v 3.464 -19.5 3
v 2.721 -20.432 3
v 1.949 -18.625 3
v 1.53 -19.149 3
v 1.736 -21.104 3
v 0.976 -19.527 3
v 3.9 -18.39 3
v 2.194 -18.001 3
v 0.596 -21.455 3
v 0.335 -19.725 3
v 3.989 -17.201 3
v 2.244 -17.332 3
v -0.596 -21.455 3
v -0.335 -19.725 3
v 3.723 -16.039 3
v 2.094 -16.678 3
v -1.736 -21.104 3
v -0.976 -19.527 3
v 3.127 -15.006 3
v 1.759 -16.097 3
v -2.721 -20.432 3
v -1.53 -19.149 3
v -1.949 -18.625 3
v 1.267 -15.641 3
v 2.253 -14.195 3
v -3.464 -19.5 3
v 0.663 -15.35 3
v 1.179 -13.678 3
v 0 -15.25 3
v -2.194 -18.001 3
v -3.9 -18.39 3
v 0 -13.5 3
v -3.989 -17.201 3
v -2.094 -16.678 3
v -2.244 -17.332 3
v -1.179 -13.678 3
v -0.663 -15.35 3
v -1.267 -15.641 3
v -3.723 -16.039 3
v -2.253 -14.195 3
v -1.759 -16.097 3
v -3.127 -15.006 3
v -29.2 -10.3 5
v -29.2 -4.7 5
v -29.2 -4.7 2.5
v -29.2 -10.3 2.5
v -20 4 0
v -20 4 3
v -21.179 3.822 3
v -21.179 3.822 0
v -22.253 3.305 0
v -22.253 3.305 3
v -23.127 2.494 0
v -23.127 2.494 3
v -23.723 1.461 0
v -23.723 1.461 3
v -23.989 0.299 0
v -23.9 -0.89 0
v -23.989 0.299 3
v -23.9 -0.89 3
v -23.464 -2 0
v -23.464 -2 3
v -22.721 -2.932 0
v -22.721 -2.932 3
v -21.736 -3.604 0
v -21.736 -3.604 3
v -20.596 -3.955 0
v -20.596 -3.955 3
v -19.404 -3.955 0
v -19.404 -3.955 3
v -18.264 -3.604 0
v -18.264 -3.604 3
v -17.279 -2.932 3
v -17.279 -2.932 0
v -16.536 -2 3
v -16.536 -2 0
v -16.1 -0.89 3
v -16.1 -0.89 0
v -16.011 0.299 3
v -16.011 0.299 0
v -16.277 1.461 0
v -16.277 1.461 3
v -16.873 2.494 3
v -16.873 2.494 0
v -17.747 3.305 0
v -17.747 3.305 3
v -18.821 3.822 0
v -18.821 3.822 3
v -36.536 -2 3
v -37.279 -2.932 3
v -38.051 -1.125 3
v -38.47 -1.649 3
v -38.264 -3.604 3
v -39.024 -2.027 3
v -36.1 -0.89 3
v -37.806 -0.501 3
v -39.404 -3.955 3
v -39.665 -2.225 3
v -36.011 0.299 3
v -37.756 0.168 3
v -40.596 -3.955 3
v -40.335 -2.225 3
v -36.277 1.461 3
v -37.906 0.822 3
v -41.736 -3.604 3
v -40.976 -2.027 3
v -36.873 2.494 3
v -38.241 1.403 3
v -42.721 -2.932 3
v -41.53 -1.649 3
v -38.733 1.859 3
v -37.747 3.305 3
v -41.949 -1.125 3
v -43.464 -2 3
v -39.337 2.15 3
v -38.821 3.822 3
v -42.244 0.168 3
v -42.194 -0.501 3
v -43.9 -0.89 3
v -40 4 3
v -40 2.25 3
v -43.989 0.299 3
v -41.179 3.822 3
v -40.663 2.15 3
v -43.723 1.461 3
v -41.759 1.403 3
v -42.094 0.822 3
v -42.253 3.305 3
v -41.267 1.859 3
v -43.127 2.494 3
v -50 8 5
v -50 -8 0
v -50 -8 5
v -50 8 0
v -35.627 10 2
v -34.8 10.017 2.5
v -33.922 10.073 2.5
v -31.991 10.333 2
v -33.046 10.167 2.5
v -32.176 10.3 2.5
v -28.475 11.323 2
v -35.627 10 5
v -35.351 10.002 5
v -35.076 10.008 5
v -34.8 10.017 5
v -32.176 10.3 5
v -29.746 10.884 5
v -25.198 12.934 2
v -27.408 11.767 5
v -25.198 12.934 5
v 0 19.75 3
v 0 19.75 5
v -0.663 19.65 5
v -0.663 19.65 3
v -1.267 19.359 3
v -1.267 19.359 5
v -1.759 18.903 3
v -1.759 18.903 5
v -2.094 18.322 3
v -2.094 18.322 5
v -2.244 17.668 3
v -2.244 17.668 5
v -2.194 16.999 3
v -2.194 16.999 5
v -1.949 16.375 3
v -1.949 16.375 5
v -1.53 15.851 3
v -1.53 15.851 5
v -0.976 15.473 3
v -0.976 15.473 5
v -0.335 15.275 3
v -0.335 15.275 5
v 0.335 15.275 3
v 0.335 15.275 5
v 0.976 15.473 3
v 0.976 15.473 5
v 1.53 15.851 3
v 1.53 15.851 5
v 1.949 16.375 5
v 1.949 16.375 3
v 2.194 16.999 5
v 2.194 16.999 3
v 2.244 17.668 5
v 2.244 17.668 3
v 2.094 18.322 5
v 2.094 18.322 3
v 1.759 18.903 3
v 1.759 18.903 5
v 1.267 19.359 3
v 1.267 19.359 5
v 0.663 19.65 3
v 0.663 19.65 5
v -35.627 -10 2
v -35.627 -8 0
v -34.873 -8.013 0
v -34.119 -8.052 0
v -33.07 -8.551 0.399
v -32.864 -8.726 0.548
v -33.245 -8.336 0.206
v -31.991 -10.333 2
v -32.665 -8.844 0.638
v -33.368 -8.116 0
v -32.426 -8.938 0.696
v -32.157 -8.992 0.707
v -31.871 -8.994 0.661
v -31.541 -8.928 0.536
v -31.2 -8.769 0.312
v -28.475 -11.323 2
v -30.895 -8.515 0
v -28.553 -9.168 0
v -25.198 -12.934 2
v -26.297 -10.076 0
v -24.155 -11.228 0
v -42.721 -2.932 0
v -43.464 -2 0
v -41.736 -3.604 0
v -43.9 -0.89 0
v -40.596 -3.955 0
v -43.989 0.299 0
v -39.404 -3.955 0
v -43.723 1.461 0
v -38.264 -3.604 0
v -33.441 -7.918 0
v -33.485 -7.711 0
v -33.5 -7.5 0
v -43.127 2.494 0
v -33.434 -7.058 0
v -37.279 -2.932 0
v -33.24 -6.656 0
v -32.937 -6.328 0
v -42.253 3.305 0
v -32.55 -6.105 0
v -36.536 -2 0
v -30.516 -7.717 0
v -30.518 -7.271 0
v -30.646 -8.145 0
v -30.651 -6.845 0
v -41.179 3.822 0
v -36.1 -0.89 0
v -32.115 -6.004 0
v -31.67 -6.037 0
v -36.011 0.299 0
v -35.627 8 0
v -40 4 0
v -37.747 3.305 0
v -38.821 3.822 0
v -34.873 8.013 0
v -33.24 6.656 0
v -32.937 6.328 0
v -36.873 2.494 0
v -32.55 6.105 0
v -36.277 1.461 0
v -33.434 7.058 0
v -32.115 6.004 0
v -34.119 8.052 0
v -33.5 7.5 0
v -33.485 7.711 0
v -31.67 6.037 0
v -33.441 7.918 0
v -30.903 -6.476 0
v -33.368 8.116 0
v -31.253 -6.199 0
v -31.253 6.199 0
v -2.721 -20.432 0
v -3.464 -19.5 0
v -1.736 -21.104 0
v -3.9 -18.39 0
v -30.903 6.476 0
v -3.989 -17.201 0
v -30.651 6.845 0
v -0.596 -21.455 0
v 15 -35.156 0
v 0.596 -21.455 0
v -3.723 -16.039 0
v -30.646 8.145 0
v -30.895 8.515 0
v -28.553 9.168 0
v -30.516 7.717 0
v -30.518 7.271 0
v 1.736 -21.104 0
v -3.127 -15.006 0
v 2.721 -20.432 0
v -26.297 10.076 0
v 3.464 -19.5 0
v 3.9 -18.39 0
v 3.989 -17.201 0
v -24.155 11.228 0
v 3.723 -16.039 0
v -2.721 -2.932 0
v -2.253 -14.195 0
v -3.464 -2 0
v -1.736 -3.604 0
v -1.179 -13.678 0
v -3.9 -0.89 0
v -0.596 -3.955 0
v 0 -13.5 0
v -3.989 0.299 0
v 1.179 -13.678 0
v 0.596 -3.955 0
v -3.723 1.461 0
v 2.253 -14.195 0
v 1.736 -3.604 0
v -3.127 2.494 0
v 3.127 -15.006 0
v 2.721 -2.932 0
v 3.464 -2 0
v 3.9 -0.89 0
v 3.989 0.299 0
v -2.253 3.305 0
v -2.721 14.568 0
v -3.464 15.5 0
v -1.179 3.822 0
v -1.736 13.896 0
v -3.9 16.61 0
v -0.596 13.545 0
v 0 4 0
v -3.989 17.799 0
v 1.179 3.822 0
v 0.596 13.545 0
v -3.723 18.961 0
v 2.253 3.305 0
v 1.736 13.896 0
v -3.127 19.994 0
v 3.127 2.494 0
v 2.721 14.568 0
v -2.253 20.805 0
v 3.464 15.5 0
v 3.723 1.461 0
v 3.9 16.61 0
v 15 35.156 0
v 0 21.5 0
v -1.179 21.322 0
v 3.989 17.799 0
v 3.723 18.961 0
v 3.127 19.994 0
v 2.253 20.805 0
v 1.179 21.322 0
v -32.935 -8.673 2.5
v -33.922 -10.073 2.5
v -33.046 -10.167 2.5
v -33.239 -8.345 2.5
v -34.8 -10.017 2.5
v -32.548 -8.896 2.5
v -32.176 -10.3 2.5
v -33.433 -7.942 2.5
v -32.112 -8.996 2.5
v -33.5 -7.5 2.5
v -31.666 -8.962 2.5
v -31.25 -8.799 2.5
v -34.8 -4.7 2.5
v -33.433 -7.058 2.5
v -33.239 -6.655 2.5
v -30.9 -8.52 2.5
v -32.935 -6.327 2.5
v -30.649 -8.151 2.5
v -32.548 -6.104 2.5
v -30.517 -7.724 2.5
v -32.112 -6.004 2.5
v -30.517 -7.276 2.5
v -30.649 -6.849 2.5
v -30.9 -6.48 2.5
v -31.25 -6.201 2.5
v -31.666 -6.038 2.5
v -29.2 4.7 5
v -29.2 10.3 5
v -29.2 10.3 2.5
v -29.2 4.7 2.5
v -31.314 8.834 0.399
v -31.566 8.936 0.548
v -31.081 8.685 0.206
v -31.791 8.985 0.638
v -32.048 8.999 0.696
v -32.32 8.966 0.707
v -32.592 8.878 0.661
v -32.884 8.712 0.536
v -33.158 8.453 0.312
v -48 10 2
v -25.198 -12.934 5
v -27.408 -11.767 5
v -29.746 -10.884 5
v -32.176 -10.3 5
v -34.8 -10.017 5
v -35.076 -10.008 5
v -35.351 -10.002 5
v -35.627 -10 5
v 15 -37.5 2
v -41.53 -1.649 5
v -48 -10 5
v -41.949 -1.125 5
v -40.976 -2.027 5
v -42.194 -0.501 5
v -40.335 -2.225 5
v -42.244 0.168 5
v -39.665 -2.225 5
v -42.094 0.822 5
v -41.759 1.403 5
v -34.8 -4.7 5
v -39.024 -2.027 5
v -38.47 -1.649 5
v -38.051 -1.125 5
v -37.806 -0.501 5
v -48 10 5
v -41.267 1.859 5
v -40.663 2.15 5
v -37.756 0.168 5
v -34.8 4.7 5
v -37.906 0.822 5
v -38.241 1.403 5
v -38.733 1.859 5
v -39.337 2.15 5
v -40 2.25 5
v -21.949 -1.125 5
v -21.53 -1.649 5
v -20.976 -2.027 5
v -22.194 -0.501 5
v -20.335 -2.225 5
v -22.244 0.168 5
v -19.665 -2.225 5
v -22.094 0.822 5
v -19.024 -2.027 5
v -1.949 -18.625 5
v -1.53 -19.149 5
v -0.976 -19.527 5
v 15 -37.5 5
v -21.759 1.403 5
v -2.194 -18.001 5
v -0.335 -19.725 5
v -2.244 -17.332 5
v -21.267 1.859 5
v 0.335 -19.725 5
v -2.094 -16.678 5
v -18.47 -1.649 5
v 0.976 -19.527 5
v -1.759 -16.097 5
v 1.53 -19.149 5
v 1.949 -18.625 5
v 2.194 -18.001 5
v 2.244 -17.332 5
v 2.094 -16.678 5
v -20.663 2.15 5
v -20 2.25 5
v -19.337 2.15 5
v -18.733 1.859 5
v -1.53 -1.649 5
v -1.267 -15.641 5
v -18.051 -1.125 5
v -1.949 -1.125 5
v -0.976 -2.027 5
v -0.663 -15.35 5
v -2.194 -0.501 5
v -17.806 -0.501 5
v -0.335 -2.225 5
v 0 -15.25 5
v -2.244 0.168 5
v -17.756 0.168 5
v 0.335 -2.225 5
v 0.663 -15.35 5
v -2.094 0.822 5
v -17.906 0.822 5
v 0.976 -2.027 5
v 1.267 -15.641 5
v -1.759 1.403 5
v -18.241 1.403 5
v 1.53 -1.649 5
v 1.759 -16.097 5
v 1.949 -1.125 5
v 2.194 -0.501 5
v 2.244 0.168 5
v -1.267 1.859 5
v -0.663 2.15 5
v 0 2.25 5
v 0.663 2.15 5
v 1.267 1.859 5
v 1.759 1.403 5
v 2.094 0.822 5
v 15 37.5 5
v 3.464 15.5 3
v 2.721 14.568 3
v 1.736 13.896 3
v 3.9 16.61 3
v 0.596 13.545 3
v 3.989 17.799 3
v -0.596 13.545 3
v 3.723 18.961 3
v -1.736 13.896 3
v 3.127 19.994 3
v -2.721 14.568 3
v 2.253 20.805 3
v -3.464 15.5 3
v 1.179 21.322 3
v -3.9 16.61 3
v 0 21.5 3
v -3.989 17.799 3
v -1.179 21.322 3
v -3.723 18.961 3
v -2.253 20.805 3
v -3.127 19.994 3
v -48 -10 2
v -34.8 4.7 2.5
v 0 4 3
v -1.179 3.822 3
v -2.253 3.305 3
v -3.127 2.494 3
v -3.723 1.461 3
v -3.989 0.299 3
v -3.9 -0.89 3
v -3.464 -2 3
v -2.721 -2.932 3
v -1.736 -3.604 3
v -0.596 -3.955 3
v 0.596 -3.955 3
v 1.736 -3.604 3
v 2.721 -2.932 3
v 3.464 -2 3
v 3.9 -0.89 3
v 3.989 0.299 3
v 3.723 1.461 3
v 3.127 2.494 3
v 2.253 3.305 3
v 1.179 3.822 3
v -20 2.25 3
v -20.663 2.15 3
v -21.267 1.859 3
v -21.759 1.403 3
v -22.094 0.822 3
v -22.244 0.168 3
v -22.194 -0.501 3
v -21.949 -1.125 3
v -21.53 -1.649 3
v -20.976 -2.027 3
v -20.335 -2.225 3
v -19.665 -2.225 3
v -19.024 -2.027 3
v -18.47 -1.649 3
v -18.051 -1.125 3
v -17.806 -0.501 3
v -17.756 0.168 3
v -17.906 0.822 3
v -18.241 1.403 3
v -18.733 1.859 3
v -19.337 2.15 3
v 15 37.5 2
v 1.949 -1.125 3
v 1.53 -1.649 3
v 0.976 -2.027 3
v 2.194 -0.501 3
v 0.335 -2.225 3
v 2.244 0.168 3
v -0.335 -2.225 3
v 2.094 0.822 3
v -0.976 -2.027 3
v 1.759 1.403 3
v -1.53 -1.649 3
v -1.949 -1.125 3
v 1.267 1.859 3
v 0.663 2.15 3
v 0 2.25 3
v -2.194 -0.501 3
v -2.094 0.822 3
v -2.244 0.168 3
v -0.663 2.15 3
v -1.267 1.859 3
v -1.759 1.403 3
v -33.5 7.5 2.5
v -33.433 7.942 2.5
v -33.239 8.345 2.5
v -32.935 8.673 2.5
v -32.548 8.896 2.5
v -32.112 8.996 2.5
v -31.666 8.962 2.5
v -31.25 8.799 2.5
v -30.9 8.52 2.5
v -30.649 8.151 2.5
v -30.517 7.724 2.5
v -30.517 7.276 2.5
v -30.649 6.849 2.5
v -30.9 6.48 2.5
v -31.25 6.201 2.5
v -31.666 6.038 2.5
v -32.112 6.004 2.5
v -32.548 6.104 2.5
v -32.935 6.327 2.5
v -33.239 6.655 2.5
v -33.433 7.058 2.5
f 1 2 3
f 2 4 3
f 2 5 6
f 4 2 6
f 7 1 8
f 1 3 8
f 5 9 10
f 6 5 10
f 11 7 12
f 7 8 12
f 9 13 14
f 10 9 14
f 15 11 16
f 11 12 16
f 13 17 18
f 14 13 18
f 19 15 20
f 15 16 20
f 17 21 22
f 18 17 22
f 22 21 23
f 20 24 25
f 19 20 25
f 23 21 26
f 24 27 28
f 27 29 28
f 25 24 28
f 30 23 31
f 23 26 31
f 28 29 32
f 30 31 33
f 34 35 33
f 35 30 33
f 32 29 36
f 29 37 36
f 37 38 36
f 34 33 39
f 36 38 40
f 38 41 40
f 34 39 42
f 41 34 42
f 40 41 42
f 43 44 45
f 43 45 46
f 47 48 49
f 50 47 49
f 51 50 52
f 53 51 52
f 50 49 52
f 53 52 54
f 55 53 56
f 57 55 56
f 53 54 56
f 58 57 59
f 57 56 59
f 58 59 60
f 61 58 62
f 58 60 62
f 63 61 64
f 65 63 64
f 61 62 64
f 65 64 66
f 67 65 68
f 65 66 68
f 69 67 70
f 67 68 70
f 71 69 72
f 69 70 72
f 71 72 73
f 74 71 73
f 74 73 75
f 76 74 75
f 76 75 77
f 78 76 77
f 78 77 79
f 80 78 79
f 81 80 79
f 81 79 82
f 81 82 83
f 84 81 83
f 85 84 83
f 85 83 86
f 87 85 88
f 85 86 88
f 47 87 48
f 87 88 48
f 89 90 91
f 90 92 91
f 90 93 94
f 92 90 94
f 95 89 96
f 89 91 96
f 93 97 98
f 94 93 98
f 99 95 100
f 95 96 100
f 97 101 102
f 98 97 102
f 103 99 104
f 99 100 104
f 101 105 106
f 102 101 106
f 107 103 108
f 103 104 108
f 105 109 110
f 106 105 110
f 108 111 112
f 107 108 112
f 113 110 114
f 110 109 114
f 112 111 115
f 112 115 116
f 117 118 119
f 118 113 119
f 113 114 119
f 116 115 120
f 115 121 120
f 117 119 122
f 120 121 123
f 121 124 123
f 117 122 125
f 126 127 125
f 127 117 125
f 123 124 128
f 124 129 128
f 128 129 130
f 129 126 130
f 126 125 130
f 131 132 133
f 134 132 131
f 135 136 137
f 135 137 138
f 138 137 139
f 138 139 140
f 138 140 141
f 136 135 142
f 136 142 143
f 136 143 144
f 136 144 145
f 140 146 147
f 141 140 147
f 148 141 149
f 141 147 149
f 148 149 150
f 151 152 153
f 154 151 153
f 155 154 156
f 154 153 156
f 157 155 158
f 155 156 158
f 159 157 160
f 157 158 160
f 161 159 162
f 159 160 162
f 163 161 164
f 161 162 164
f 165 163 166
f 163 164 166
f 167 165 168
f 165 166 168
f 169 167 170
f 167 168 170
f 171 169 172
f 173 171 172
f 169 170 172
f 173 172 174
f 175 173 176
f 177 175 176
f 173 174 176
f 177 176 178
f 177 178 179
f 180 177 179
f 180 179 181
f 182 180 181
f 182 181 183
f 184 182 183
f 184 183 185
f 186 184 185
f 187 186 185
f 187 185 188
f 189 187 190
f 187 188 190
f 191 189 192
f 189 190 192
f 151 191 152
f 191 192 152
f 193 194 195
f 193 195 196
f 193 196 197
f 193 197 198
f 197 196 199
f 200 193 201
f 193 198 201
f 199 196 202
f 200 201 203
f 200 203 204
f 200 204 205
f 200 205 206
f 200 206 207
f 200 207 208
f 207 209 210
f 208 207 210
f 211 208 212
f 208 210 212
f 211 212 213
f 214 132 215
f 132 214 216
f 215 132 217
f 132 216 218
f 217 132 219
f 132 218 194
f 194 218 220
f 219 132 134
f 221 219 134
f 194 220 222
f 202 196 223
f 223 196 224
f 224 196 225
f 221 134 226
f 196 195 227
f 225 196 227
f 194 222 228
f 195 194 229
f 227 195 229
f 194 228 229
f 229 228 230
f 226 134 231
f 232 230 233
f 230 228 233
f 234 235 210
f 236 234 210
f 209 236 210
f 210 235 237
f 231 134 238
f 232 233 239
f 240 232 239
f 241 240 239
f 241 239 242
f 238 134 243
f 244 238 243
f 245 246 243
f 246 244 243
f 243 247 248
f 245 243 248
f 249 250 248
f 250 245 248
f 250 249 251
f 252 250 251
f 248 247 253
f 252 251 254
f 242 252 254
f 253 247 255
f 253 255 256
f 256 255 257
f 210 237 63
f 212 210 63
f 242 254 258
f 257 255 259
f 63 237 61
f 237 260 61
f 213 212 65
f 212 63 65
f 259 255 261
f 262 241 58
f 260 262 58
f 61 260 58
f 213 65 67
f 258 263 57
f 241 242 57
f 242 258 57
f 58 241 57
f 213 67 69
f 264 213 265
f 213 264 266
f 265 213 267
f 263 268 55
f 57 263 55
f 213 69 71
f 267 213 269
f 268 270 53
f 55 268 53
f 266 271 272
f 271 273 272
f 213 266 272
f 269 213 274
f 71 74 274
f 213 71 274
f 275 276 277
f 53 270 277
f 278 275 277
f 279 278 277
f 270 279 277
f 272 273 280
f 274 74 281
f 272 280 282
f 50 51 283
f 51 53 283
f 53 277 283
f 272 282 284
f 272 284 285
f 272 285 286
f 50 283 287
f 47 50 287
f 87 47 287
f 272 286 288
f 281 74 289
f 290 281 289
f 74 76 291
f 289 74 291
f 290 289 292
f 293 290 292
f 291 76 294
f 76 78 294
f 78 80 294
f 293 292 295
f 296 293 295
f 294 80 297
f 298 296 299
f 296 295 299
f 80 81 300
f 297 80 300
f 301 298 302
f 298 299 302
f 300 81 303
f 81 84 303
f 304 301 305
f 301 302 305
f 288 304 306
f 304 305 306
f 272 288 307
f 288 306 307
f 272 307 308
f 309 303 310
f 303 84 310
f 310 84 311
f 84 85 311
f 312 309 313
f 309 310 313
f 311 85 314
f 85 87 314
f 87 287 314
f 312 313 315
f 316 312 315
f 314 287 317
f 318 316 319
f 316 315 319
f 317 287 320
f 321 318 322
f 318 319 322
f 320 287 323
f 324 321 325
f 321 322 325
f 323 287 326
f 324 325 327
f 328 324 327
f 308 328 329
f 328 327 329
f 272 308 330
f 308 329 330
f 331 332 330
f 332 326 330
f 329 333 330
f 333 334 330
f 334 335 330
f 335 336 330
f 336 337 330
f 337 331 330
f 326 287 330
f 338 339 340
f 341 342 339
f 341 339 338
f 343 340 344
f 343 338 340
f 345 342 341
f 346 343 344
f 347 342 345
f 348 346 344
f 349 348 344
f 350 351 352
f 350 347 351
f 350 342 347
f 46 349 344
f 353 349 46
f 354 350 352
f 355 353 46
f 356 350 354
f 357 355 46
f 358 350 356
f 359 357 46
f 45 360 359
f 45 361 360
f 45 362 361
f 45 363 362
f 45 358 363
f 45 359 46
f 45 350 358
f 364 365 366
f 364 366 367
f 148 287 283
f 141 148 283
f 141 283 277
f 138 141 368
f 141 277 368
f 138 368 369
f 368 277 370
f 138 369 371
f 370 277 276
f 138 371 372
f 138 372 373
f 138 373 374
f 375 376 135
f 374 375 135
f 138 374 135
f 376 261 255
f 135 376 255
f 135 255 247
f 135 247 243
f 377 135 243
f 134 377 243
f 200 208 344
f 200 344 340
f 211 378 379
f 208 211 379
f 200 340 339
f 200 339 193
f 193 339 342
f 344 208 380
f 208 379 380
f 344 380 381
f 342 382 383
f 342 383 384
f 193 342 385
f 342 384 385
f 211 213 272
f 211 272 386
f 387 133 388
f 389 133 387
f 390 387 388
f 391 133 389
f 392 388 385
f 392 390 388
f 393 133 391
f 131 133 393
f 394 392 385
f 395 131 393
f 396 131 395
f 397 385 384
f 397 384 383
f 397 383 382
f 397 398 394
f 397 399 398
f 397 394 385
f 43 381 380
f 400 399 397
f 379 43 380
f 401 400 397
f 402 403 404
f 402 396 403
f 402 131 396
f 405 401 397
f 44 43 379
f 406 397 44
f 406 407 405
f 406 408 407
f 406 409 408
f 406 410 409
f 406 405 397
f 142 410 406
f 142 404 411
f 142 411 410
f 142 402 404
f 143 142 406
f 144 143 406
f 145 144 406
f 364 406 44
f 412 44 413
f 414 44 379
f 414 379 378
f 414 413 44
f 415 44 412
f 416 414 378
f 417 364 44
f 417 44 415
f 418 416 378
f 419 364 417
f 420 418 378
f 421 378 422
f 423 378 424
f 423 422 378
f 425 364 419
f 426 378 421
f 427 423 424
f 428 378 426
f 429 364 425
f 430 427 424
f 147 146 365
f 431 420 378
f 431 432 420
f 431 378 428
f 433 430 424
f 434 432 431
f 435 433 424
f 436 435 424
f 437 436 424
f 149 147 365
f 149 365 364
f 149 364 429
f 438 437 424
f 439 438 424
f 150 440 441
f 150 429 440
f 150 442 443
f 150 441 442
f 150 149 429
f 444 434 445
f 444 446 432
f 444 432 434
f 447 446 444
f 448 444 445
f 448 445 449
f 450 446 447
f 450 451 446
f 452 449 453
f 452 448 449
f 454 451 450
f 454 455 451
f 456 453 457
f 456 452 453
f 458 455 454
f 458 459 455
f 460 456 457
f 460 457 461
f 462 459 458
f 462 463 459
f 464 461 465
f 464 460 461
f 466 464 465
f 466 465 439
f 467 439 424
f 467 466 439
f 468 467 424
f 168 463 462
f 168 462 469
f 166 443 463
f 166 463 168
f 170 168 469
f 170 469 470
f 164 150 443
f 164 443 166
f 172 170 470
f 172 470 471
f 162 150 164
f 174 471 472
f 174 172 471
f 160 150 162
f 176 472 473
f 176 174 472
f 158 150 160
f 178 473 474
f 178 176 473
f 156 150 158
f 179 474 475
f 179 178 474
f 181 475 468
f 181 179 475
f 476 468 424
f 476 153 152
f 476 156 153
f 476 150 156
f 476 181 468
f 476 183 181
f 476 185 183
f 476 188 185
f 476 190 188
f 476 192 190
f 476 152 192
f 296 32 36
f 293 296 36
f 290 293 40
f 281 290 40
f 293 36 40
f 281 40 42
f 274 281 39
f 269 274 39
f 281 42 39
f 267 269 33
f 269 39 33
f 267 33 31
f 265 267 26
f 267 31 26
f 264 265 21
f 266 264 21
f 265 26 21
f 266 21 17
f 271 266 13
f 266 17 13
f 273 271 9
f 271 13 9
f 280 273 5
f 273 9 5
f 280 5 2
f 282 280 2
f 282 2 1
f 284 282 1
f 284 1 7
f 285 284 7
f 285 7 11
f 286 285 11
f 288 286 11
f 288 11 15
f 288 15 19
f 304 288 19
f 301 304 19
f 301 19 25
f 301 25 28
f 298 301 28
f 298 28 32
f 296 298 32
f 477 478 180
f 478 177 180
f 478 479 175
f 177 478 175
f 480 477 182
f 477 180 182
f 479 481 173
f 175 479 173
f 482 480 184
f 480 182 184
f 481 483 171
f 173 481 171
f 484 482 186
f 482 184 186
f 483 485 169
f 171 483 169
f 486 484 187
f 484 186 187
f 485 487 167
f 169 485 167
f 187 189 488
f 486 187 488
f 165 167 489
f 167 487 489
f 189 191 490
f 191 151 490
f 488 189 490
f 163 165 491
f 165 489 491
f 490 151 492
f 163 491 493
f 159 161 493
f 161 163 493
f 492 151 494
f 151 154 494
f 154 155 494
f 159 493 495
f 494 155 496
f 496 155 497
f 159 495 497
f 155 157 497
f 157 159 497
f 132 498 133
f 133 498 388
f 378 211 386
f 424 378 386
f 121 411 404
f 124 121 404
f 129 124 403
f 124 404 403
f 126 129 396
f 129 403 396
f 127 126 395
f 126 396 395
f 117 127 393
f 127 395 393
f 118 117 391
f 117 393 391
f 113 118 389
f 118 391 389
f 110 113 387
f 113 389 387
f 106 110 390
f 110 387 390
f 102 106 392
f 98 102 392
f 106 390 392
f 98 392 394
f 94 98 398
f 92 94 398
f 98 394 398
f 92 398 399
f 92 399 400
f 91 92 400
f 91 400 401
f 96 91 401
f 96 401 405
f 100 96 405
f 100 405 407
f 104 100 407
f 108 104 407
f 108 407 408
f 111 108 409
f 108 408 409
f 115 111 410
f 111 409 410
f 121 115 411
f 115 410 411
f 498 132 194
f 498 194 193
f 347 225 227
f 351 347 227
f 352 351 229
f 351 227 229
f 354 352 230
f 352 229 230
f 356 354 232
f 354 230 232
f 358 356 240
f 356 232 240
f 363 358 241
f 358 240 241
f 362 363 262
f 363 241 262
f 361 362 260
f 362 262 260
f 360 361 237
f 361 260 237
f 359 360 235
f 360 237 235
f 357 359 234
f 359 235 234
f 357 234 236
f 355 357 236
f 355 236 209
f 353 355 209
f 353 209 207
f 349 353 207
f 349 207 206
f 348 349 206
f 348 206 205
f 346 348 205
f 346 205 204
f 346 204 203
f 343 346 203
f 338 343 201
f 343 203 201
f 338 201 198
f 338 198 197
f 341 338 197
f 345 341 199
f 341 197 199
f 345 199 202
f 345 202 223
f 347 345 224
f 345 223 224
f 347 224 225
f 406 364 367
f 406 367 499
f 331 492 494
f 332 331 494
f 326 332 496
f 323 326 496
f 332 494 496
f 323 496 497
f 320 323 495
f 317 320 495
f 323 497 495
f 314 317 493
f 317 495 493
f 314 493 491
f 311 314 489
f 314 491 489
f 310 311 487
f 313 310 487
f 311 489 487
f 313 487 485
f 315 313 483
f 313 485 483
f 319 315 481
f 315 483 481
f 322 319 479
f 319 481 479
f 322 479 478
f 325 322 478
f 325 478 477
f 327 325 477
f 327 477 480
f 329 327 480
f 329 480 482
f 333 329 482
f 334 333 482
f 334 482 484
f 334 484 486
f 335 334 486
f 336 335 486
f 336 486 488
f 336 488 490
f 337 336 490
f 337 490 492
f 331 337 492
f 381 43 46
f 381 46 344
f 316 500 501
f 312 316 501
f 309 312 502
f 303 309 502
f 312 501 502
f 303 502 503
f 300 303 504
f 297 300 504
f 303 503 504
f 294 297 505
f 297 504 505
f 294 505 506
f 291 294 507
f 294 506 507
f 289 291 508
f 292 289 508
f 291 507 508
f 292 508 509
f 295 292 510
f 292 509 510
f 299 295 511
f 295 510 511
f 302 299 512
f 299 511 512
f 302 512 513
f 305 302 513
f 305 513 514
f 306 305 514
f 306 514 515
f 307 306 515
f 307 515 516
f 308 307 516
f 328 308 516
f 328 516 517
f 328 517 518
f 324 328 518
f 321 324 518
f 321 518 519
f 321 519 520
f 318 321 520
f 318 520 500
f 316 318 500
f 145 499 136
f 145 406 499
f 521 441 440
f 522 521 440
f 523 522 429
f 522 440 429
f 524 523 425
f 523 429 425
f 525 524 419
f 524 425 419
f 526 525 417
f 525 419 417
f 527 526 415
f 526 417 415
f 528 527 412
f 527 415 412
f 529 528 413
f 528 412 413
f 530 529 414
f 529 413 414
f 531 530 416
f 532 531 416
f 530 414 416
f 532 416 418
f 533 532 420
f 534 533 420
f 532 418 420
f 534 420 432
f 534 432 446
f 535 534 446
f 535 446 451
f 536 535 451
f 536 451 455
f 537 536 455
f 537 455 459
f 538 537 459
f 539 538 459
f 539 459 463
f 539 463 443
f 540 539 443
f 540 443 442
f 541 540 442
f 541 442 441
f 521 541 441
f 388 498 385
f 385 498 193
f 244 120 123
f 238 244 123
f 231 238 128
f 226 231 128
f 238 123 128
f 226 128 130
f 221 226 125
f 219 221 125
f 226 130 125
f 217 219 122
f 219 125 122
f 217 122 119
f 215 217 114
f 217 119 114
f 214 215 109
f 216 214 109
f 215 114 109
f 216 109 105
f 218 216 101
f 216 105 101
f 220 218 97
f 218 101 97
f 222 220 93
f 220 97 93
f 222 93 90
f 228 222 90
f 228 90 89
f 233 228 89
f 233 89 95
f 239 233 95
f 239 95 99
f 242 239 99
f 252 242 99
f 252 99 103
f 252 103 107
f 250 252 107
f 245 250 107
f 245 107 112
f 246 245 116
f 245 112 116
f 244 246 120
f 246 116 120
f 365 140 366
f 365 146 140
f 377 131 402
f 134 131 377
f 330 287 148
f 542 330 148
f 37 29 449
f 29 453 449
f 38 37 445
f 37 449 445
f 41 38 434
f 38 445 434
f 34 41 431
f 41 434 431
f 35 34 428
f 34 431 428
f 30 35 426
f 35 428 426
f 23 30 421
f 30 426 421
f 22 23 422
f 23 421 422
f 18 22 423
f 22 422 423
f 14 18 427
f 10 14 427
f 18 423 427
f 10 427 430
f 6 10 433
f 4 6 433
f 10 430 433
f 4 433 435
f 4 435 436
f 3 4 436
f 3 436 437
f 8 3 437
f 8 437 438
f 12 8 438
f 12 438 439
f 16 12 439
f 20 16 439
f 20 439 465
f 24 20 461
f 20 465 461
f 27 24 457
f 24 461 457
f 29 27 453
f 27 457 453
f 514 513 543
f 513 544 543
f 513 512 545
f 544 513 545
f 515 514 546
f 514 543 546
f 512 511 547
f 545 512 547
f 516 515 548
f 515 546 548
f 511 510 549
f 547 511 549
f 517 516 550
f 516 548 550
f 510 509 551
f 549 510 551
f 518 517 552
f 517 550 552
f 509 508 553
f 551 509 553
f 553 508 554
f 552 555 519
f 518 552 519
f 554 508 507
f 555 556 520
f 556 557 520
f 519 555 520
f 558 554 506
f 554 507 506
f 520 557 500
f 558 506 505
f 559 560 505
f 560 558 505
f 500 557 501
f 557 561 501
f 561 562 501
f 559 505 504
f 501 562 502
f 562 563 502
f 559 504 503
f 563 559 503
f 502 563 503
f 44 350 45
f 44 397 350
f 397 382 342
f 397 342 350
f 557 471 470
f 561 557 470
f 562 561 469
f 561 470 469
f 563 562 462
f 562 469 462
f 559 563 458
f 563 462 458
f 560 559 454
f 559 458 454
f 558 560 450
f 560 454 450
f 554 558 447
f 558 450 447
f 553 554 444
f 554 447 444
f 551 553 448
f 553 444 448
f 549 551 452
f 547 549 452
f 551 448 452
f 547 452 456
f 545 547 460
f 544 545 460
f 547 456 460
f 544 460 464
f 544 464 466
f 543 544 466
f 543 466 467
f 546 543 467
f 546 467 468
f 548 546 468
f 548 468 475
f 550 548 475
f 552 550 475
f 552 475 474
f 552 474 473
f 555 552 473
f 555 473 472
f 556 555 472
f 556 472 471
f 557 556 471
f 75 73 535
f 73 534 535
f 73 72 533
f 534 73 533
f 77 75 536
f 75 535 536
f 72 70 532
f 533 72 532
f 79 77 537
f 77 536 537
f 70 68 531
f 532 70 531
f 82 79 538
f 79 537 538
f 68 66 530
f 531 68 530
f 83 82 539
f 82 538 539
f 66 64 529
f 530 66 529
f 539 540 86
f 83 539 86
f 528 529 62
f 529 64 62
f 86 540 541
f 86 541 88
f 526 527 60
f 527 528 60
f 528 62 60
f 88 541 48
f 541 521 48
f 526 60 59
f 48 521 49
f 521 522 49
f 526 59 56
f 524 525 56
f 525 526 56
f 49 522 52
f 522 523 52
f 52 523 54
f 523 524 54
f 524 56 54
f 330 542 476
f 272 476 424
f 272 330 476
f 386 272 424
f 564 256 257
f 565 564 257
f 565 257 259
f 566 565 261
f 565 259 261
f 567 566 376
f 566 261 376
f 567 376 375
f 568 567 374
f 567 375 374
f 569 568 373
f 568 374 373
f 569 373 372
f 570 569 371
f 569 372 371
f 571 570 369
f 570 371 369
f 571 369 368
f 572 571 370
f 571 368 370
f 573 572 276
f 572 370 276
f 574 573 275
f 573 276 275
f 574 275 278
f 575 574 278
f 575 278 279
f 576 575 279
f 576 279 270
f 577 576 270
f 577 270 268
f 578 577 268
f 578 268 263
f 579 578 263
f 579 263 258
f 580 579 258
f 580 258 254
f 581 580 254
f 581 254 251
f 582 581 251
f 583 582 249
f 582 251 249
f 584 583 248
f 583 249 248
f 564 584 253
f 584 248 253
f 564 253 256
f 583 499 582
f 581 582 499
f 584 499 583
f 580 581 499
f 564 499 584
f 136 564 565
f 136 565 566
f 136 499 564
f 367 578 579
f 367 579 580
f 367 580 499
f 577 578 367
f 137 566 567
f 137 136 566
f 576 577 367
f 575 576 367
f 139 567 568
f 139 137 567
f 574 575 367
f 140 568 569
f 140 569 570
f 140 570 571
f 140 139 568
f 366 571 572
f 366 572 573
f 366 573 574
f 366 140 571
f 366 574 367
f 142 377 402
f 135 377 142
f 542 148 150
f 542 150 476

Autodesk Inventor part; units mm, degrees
ref_plane "YZ Plane" through (0, 0, 0) normal (1, 0, 0) x (0, 1, 0)
ref_plane "XZ Plane" through (0, 0, 0) normal (0, 1, 0) x (-1, 0, 0)
ref_plane "XY Plane" through (0, 0, 0) normal (0, 0, 1) x (1, 0, 0)
sketch "Sketch1" plane through (0, 0, 0) normal (0, 0, 1) x (1, 0, 0)
  line L0 (0, 0) -> (-50, 0) construction
  line L1 (-50, 0) -> (-50, 10)
  line L2 (-50, 0) -> (-50, -10)
  line L3 (-50, -10) -> (-30, -10)
  line L4 (-30, -10) -> (15, -37.5)
  line L5 (-50, 10) -> (-30, 10)
  line L6 (-30, 10) -> (15, 37.5)
  line L7 (15, 37.5) -> (15, -37.5)
  line L8 (0, 0) -> (15, 0) construction
  line L9 (0, 17.5) -> (0, -17.5) construction
  point P0 (-40, 0)
  point P1 (-20, 0)
  dimension "d0" = 20
  dimension "d1" = 65
  dimension "d2" = 50
  dimension "d4" = 20
  dimension "d5" = 75
  dimension "d6" = 35
  dimension "d9" = 40
  dimension "d41" = 20
extrude "Extrusion1" add sketch "Sketch1" along normal blind 5
hole "Hole1" at (0, 17.5, 0) at (0, -17.5, 0) at (-40, 0, 0) at (0, 0, 0) at (-20, 0, 0) direction (0, 0, 1) diameter 4.5 end through all counterbore diameter 8 counterbore depth 3
fillet "Fillet1" radius 20 2 edges at (-30, 10, 2.5) (-30, -10, 2.5)
chamfer "Chamfer1" distance 2 angle 45 2 edges at (-50, 10, 2.5) (-50, -10, 2.5)
sketch "Sketch2" plane through (0, 0, 0) normal (0, 0, -1) x (-1, 0, 0)
  line L0 (50, -8) -> (48, -10) projected
  line L1 (50, 8) -> (50, -8) projected
  line L2 (48, 10) -> (50, 8) projected
  line L3 (35.6273, 10) -> (48, 10) projected
  arc A0 (25.1983, 12.9344) -> (35.6273, 10) centre (35.6273, 30) ccw projected
  line L4 (-15, 37.5) -> (25.1983, 12.9344) projected
  line L5 (-15, -37.5) -> (-15, 37.5) projected
  line L6 (25.1983, -12.9344) -> (-15, -37.5) projected
  arc A1 (35.6273, -10) -> (25.1983, -12.9344) centre (35.6273, -30) ccw projected
  line L7 (48, -10) -> (35.6273, -10) projected
  circle A2 centre (0, 0) radius 4 projected
  circle A3 centre (40, 0) radius 4 projected
  circle A4 centre (0, -17.5) radius 4 projected
  circle A5 centre (0, 17.5) radius 4 projected
  line L8 (32, 7.5) -> (32, -7.5) construction
  line L9 (50, 0) -> (32, 0) construction
  circle A6 centre (32, 7.5) radius 1.5
  circle A7 centre (32, -7.5) radius 1.5
  line L10 (29, 4) -> (32, 4)
  line L11 (32, 4) -> (32, -4)
  line L12 (32, -4) -> (29, -4)
  line L13 (29, -4) -> (29, 4)
  line L14 (50, 4) -> (47, 4)
  line L15 (47, 4) -> (47, -4)
  line L16 (47, -4) -> (50, -4)
  line L17 (50, -4) -> (50, 4)
  line L18 (50, 8) -> (50, -8) projected
  point P0 (32, 0)
  point P1 (47, 0)
  dimension "d24" = 18
  dimension "d25" = 15
  dimension "d26" = 3
  dimension "d27" = 3
  dimension "d30" = 3
  dimension "d31" = 3
  dimension "d32" = 8
  dimension "d33" = 8
  dimension "d34" = 3
extrude "Extrusion2" cut sketch "Sketch2" against normal through all contours A6 | A7
chamfer "Chamfer2" distance 2 angle 45 6 edges at (-41.8137, 10, 0) (-30.2103, 10.7476, 0) (-5.0992, 25.2172, 0) (-30.2103, -10.7476, 0) (-5.0992, -25.2172, 0) (-41.8137, -10, 0)
sketch "Sketch3" plane through (0, 0, 5) normal (0, 0, 1) x (1, 0, 0)
  circle A0 centre (-32, 7.5) radius 1.5 projected
  circle A1 centre (-32, -7.5) radius 1.5 projected
  line L0 (-29.2, 4.7) -> (-34.8, 4.7)
  line L1 (-34.8, 4.7) -> (-34.8, 10.3)
  line L2 (-34.8, 10.3) -> (-29.2, 10.3)
  line L3 (-29.2, 10.3) -> (-29.2, 4.7)
  line L4 (-29.2, 4.7) -> (-34.8, 10.3) construction
  line L5 (-34.8, 4.7) -> (-29.2, 10.3) construction
  line L6 (-29.2, -10.3) -> (-34.8, -10.3)
  line L7 (-34.8, -10.3) -> (-34.8, -4.7)
  line L8 (-34.8, -4.7) -> (-29.2, -4.7)
  line L9 (-29.2, -4.7) -> (-29.2, -10.3)
  line L10 (-29.2, -10.3) -> (-34.8, -4.7) construction
  line L11 (-34.8, -10.3) -> (-29.2, -4.7) construction
  point P0 (0, 0)
  dimension "d37" = 5.6
  dimension "d38" = 5.6
extrude "Extrusion4" cut sketch "Sketch3" against normal blind 2.5
equation "\"d27\" = d26"
properties part number "Y Axis Holder_3DPrint"
